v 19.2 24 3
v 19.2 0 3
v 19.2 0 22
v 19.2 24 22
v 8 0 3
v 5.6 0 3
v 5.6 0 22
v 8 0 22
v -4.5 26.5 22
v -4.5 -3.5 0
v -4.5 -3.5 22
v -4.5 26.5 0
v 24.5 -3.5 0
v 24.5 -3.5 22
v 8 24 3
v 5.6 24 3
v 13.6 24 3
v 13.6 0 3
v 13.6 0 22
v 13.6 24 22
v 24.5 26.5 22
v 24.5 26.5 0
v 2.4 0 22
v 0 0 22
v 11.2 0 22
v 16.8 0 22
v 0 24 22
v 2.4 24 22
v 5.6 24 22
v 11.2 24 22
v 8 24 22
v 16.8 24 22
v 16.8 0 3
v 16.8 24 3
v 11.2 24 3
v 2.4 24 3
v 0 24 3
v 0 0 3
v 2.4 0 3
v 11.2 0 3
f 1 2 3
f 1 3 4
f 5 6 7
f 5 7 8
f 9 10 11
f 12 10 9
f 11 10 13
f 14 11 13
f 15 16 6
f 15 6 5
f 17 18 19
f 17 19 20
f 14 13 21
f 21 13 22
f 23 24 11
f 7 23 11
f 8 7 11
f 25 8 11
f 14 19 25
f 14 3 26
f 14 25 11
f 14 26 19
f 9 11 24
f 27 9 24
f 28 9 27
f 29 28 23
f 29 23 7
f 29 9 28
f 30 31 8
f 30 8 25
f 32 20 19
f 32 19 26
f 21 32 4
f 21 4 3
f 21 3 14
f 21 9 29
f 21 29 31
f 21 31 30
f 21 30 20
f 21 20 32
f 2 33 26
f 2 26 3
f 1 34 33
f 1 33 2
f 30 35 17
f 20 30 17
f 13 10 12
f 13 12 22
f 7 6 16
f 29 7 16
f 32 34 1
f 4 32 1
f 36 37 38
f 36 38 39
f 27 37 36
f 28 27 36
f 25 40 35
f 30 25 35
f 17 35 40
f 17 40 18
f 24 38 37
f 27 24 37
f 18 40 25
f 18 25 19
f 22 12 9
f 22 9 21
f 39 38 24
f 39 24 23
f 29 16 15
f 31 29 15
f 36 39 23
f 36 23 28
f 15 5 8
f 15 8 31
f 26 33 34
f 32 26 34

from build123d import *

# Parameters (mm, degrees)
BOX001_W     = 2.4
BOX001_H     = 24
BOX001_DEPTH = 22
BOX002_W     = 2.4
BOX002_H     = 24
BOX002_DEPTH = 22
BOX003_W     = 2.4
BOX003_H     = 24
BOX003_DEPTH = 22
BOX_W        = 2.4
BOX_H        = 24
BOX_DEPTH    = 22
BOX004_W     = 29
BOX004_H     = 30
BOX004_DEPTH = 22


with BuildPart() as ranura2:
    # Box001 → Box001 (new body)
    with BuildSketch(Plane(origin=(5.6, 0, 0), x_dir=(1, 0, 0), z_dir=(0, 0, 1))):
        with Locations((1.2, 12)):
            Rectangle(BOX001_W, BOX001_H)
    extrude(amount=BOX001_DEPTH)


with BuildPart() as ranura3:
    # Box002 → Box002 (new body)
    with BuildSketch(Plane(origin=(11.2, 0, 0), x_dir=(1, 0, 0), z_dir=(0, 0, 1))):
        with Locations((1.2, 12)):
            Rectangle(BOX002_W, BOX002_H)
    extrude(amount=BOX002_DEPTH)


with BuildPart() as ranura4:
    # Box003 → Box003 (new body)
    with BuildSketch(Plane(origin=(16.8, 0, 0), x_dir=(1, 0, 0), z_dir=(0, 0, 1))):
        with Locations((1.2, 12)):
            Rectangle(BOX003_W, BOX003_H)
    extrude(amount=BOX003_DEPTH)


with BuildPart() as ranuras:
    # Box → Box (new body)
    with BuildSketch(Plane.XY):
        with Locations((1.2, 12)):
            Rectangle(BOX_W, BOX_H)
    extrude(amount=BOX_DEPTH)

    # Fusion: union ranura2, ranura3, ranura4
    add(ranura2.part)
    add(ranura3.part)
    add(ranura4.part)


with BuildPart() as ranuras_1:
    # Fusion placement: moved
    add(ranuras.part.moved(Location((0, 0, 3))))


with BuildPart() as cut:
    # Box004 → Box004 (new body)
    with BuildSketch(Plane(origin=(-4.5, -3.5, 0), x_dir=(1, 0, 0), z_dir=(0, 0, 1))):
        with Locations((14.5, 15)):
            Rectangle(BOX004_W, BOX004_H)
    extrude(amount=BOX004_DEPTH)

    # Cut: cut ranuras
    add(ranuras_1.part, mode=Mode.SUBTRACT)


solid = cut.part
